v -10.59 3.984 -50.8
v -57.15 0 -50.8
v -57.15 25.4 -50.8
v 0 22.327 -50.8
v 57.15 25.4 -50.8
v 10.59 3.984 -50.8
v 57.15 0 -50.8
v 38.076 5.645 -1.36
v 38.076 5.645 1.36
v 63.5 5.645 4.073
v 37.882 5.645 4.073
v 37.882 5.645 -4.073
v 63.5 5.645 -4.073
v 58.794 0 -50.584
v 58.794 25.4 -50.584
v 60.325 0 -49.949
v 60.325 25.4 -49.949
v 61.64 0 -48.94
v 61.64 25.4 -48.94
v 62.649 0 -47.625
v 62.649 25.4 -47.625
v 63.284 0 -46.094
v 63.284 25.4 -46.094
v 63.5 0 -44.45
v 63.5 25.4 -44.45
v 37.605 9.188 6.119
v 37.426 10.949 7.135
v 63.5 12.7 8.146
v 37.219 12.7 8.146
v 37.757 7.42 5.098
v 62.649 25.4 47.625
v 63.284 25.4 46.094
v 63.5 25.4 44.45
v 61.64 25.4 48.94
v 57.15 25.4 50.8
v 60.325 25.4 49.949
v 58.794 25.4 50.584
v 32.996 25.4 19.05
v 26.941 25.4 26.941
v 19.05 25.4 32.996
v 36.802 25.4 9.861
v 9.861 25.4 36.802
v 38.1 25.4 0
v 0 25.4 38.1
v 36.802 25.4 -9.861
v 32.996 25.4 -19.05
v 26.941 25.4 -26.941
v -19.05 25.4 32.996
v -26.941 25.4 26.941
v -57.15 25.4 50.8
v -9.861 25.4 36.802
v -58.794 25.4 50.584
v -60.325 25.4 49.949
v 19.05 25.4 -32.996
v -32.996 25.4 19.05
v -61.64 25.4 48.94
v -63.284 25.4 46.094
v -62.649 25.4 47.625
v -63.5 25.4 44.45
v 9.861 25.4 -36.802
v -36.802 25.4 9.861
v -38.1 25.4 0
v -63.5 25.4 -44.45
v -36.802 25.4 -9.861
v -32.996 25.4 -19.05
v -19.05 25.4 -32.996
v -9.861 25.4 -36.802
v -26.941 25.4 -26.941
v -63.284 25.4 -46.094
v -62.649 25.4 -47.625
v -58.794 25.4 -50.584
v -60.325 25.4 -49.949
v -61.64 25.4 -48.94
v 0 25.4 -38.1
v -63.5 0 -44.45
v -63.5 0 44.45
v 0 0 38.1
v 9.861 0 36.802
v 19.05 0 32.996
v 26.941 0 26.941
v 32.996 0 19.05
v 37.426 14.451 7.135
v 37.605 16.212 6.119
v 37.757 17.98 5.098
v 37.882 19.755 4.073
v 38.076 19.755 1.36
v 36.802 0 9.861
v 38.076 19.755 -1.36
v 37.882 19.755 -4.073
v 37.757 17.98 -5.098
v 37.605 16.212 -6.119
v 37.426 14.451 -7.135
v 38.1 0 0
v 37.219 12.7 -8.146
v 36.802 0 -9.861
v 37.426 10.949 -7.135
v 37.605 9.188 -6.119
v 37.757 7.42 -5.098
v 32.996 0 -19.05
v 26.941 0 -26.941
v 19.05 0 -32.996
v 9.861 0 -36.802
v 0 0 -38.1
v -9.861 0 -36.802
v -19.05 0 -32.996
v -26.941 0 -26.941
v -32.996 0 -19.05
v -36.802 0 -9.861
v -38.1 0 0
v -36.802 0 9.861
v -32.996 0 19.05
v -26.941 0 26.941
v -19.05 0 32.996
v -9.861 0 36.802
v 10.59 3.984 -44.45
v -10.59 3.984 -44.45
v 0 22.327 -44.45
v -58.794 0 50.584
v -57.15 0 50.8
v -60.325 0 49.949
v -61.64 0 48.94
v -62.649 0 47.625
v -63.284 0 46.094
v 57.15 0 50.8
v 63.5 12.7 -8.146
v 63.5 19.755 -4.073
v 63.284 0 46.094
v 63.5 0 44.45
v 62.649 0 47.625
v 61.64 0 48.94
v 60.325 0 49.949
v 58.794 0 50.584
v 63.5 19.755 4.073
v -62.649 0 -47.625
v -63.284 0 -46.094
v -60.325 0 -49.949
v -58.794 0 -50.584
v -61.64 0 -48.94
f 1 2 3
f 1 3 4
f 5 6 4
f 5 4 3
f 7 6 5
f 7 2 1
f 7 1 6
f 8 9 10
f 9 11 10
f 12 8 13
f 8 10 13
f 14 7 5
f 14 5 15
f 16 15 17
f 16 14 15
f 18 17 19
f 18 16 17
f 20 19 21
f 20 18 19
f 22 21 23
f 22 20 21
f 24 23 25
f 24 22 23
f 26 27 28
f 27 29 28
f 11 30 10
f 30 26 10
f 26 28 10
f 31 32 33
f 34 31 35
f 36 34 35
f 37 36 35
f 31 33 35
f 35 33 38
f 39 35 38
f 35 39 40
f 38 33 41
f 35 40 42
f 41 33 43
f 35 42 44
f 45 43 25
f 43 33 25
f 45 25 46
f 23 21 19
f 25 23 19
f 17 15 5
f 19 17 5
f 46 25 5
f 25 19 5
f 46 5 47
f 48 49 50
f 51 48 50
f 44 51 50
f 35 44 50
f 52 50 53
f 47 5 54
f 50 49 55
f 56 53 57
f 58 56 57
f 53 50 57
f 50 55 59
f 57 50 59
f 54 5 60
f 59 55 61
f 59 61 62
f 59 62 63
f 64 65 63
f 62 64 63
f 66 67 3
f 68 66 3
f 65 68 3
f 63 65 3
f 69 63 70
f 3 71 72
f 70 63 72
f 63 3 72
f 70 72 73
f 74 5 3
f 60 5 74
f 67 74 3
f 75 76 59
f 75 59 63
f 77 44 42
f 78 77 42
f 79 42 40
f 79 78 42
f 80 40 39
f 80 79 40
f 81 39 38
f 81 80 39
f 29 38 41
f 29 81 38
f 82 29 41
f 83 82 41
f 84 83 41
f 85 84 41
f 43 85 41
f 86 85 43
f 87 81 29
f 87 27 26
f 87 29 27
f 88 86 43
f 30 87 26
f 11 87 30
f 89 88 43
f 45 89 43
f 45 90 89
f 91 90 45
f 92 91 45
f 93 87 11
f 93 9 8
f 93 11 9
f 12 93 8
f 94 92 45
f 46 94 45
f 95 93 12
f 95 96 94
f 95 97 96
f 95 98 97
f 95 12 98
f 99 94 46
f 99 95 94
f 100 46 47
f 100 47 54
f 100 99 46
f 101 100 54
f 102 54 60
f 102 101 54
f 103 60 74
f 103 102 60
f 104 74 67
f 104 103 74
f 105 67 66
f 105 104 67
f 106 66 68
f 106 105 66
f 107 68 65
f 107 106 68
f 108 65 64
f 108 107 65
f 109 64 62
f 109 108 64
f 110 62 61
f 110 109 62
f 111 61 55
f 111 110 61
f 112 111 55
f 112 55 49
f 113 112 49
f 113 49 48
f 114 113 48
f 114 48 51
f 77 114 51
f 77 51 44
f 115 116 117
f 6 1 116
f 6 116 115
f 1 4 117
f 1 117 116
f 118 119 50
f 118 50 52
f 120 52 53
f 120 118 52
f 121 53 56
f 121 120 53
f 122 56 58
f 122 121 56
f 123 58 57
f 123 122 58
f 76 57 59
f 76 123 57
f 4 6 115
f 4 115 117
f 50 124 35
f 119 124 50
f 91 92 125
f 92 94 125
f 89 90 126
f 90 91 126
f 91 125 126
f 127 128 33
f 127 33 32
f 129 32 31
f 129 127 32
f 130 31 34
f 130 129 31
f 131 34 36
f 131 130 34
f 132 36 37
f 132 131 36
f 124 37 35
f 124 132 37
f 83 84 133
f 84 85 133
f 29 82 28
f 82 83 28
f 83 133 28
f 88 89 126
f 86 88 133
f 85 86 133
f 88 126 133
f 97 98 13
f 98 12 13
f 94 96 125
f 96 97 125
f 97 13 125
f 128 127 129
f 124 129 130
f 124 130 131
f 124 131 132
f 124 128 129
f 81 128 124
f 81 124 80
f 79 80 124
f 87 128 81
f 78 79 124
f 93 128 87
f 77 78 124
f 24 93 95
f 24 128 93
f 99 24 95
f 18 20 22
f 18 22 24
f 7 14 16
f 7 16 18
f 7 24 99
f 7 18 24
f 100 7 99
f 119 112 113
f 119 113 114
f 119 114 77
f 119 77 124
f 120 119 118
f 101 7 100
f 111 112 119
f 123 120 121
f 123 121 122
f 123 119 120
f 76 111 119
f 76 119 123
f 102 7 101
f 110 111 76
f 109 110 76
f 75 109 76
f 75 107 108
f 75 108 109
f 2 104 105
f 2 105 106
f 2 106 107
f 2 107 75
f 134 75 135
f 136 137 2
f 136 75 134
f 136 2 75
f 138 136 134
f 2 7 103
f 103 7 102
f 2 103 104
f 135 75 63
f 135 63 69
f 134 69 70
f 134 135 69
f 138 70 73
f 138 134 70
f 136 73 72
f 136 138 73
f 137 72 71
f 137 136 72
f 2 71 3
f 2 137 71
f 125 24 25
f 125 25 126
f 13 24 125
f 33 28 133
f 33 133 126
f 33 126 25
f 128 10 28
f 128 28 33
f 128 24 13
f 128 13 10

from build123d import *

# Parameters (mm, degrees)
SKETCH1_R               = 38.1
BOSS_EXTRUDE1_DEPTH     = 25.4
CUT_EXTRUDE1_REACH      = 141.122
CUT_EXTRUDE1_END_RADIUS = 38.1
CUT_EXTRUDE3_DEPTH      = 6.35


with BuildPart() as part:
    # Sketch1 → Boss-Extrude1 (new body)
    with BuildSketch(Plane(origin=(0, 0, 0), x_dir=(1, 0, 0), z_dir=(0, 1, 0))):
        with BuildLine():
            Line((-57.15, 50.8), (57.15, 50.8))
            ThreePointArc((57.15, 50.8), (61.640128061, 48.940128061), (63.5, 44.45))
            Line((63.5, 44.45), (63.5, -44.45))
            ThreePointArc((63.5, -44.45), (61.640128061, -48.940128061), (57.15, -50.8))
            Line((57.15, -50.8), (-57.15, -50.8))
            ThreePointArc((-57.15, -50.8), (-61.640128061, -48.940128061), (-63.5, -44.45))
            Line((-63.5, -44.45), (-63.5, 44.45))
            ThreePointArc((-63.5, 44.45), (-61.640128061, 48.940128061), (-57.15, 50.8))
        make_face()
        with Locations(Location((0, 0, 0), (0, 0, 270))):
            Circle(SKETCH1_R, mode=Mode.SUBTRACT)
    extrude(amount=BOSS_EXTRUDE1_DEPTH)

    # Cut-Extrude1: up to this cylinder (the profile starts outside it)
    cut_extrude1_end = Plane(origin=(0, 12.7, 0), z_dir=(0, -1, 0)) * Cylinder(CUT_EXTRUDE1_END_RADIUS, 359.444, mode=Mode.PRIVATE)
    # Sketch2 → Cut-Extrude1 (cut, up to the surface)
    with BuildSketch(Plane(origin=(63.5, 0, 0), x_dir=(0, 0, -1), z_dir=(1, 0, 0)), mode=Mode.PRIVATE) as cut_extrude1_sk1:
        Polygon((8.146406132, 12.7), (4.073203066, 19.75499466), (-4.073203066, 19.75499466), (-8.146406132, 12.7), (-4.073203066, 5.64500534), (4.073203066, 5.64500534), align=None)
    cut_extrude1_tool1 = extrude(cut_extrude1_sk1.sketch, amount=-CUT_EXTRUDE1_REACH, mode=Mode.PRIVATE) - cut_extrude1_end
    add(cut_extrude1_tool1.solids().sort_by_distance((63.5, 12.7, 0))[0], mode=Mode.SUBTRACT)

    # Sketch3 → Cut-Extrude3 (cut)
    with BuildSketch(Plane(origin=(0, 0, -50.8), x_dir=(-1, 0, 0), z_dir=(0, 0, -1))):
        Polygon((0, 22.327483366), (10.590327972, 3.984497249), (-10.590327972, 3.984497249), align=None)
    extrude(amount=-CUT_EXTRUDE3_DEPTH, mode=Mode.SUBTRACT)


solid = part.part
